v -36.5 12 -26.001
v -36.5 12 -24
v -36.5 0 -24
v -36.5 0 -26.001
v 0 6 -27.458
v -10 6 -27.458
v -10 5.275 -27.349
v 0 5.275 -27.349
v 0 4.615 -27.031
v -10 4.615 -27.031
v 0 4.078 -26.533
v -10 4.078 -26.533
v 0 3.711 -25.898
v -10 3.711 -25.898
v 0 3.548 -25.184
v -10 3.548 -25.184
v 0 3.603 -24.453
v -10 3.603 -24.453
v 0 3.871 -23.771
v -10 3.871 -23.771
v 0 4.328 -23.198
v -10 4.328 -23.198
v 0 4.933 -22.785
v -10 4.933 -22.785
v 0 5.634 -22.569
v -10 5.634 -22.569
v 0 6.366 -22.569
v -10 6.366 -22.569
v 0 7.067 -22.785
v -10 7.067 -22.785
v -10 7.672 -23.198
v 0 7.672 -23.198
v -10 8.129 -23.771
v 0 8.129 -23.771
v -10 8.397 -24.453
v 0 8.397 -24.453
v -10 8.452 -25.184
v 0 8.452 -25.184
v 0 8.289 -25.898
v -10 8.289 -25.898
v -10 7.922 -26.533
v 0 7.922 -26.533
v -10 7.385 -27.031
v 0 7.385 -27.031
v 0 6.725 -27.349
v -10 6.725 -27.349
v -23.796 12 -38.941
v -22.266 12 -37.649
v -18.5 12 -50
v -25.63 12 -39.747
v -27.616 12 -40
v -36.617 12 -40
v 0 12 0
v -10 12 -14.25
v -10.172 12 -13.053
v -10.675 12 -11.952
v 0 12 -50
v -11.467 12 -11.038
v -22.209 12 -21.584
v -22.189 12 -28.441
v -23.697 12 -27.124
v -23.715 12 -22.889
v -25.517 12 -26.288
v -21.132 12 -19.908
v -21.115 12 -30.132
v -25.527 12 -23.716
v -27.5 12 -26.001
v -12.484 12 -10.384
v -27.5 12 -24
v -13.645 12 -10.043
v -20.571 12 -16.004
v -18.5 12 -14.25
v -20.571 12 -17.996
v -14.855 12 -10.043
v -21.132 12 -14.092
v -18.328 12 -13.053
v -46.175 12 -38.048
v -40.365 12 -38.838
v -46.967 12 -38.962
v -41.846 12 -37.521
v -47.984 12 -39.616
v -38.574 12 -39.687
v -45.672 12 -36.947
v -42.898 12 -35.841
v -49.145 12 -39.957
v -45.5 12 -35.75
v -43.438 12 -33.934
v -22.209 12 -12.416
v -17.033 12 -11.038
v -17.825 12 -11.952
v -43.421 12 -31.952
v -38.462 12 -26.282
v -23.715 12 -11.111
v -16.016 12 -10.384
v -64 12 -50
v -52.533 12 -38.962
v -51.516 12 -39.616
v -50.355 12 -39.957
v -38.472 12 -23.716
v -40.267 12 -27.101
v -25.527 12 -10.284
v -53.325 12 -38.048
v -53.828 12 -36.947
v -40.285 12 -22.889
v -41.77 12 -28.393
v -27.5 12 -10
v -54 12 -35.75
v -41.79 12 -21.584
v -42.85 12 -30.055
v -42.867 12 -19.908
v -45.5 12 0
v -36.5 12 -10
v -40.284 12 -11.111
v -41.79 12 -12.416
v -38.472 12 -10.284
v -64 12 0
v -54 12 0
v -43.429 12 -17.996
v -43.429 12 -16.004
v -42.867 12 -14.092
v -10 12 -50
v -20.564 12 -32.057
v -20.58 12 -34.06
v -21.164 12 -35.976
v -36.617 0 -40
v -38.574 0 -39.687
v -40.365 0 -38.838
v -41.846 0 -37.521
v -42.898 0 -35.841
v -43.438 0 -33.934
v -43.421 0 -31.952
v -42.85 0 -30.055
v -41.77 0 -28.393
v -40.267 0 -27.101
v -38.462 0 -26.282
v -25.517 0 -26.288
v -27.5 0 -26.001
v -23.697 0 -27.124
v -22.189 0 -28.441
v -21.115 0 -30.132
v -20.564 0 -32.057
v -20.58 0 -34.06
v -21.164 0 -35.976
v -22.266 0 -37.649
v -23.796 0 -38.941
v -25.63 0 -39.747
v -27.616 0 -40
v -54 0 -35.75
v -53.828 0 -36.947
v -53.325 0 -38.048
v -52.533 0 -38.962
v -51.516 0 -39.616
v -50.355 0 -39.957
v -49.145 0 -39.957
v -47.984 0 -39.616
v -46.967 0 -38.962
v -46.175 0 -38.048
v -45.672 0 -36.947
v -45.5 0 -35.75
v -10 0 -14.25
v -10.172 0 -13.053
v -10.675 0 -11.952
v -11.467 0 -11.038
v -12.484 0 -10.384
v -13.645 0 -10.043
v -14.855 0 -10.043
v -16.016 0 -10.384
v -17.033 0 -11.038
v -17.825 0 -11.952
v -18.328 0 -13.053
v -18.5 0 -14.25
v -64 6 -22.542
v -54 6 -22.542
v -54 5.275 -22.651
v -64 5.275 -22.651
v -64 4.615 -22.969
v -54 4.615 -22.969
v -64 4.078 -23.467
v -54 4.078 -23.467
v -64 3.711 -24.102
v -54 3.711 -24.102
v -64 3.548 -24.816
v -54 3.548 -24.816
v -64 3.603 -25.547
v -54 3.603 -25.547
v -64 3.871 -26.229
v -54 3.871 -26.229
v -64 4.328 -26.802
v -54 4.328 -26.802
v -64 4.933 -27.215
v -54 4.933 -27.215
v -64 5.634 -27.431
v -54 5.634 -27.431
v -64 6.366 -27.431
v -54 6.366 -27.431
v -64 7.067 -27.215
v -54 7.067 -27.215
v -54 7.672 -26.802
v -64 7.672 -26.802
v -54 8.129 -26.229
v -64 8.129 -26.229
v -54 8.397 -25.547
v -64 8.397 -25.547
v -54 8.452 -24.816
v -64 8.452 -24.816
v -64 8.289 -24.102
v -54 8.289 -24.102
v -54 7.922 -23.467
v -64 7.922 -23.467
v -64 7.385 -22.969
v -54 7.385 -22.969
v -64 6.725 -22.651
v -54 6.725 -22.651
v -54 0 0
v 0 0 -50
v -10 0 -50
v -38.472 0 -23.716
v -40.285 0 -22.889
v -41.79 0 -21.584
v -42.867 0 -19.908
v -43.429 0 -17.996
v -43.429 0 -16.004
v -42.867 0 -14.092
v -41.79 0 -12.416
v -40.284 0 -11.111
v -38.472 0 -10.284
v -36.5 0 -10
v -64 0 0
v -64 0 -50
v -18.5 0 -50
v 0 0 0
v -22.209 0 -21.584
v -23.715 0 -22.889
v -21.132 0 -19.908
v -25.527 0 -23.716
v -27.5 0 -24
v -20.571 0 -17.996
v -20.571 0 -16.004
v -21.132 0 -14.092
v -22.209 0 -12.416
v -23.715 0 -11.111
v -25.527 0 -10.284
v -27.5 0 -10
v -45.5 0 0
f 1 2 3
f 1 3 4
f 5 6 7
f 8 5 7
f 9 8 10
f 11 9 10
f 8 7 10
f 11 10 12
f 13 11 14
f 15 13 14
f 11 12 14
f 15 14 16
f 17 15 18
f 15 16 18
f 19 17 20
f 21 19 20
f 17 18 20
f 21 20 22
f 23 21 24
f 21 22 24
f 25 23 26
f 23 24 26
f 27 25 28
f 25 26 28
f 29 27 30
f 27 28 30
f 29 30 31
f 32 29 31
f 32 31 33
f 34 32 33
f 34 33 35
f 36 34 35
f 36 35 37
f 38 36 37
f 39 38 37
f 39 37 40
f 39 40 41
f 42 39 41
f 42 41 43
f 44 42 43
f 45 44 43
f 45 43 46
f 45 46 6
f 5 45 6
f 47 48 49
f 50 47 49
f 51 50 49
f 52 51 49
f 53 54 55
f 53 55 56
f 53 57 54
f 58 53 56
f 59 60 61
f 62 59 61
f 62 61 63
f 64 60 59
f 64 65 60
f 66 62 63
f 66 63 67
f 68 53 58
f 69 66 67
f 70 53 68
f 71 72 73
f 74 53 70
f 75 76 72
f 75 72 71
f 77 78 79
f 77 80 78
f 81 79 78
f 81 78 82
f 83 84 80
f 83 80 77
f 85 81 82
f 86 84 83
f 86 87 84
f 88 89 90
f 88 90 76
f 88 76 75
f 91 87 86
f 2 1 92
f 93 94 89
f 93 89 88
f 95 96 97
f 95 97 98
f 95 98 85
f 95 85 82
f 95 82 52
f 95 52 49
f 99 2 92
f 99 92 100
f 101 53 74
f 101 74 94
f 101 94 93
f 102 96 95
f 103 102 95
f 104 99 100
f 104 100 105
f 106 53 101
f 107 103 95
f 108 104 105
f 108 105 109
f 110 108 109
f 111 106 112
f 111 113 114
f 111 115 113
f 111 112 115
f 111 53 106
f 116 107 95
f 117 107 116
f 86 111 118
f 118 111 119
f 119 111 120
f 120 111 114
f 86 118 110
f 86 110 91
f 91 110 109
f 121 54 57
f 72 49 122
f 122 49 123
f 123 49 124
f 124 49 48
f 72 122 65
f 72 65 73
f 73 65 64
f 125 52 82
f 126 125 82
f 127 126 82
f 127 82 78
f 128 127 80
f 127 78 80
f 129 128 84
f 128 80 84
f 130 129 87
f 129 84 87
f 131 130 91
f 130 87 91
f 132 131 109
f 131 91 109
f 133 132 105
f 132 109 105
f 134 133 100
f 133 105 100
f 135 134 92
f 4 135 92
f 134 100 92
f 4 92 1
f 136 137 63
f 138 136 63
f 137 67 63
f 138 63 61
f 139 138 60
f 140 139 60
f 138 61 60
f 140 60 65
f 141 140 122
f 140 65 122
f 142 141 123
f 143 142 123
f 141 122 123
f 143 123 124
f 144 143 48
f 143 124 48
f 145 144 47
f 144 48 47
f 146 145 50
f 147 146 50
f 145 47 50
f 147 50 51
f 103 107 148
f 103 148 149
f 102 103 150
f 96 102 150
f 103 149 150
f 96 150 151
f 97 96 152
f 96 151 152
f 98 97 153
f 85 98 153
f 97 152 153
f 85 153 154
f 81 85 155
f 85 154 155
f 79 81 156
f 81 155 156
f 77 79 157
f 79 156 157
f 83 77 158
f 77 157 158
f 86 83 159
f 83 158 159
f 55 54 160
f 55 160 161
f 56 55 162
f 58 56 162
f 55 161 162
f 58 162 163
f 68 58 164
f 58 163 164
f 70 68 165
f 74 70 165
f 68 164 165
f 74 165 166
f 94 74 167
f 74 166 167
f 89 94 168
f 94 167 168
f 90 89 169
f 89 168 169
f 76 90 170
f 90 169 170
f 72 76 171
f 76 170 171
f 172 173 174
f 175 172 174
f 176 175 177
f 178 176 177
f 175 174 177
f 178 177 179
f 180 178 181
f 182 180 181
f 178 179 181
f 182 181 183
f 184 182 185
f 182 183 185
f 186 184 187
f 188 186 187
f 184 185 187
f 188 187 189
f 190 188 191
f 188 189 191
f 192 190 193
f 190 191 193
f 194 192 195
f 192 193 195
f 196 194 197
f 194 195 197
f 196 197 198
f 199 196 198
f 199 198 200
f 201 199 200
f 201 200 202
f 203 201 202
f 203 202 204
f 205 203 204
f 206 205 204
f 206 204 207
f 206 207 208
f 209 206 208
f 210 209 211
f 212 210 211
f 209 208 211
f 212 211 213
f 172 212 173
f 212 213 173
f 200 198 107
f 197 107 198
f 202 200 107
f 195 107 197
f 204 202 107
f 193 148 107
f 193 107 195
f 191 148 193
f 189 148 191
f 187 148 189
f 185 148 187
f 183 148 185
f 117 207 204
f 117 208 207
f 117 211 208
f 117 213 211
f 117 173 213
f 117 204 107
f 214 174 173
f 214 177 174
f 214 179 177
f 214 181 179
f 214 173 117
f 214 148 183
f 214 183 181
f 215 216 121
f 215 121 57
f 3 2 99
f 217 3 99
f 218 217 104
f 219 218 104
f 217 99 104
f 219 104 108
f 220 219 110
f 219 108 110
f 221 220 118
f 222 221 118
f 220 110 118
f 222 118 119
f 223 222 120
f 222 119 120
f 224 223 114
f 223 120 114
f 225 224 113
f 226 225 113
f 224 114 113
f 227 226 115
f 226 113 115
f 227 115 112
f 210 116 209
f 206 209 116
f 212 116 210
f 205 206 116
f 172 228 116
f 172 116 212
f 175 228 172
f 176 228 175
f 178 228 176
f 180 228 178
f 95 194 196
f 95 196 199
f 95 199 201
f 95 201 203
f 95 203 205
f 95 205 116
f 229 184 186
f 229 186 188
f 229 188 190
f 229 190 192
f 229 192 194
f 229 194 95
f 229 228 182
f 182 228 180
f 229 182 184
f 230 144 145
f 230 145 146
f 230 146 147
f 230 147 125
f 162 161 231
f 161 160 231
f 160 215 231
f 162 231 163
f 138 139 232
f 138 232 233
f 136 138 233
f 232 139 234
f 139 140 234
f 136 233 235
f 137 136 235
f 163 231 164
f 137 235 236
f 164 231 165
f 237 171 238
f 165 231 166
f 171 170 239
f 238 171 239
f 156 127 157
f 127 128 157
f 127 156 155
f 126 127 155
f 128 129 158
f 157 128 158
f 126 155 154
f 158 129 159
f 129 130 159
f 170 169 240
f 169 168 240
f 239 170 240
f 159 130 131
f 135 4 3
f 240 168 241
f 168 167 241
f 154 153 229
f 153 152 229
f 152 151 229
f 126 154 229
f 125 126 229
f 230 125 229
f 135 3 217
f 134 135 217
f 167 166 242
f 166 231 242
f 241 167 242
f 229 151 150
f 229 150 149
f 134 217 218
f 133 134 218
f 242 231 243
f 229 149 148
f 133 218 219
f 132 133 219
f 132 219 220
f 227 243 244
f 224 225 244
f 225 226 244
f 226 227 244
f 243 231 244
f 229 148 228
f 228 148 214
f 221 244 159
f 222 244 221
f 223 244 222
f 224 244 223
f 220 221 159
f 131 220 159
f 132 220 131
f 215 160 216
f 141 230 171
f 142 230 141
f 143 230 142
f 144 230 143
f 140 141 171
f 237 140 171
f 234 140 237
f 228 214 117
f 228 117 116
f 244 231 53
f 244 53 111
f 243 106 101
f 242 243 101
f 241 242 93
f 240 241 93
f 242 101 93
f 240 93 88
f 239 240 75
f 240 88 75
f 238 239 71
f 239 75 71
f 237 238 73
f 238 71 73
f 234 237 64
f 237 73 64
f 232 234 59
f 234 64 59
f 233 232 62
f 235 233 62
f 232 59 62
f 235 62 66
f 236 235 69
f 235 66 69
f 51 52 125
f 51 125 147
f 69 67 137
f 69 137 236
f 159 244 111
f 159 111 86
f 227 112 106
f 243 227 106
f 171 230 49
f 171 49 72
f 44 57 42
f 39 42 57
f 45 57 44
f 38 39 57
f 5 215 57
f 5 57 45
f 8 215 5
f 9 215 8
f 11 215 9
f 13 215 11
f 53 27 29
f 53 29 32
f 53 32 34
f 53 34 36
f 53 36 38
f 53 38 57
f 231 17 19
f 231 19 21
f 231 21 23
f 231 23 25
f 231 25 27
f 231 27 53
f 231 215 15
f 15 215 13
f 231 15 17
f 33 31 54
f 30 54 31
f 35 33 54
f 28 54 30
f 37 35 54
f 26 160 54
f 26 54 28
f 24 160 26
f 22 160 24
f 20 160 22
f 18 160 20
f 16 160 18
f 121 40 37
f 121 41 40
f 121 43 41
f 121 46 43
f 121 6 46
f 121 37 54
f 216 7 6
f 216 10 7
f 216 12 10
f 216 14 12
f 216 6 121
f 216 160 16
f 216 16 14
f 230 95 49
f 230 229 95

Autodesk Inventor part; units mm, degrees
ref_plane "YZ Plane" through (0, 0, 0) normal (1, 0, 0) x (0, 1, 0)
ref_plane "XZ Plane" through (0, 0, 0) normal (0, 1, 0) x (-1, 0, 0)
ref_plane "XY Plane" through (0, 0, 0) normal (0, 0, 1) x (1, 0, 0)
sketch "Esboço1" plane through (0, 0, 0) normal (0, 1, 0) x (-1, 0, 0)
  line L0 (0, 0) -> (45.5, 0)
  line L1 (45.5, 0) -> (45.5, -35.75)
  line L2 (49.75, -40) -> (49.75, -40)
  line L3 (54, -35.75) -> (54, 0)
  line L4 (54, 0) -> (64, 0)
  line L5 (64, 0) -> (64, -50)
  line L6 (64, -50) -> (18.5, -50)
  line L7 (18.5, -50) -> (18.5, -14.25)
  line L8 (14.25, -10) -> (14.25, -10)
  line L9 (10, -14.25) -> (10, -50)
  line L10 (10, -50) -> (0, -50)
  line L11 (0, -50) -> (0, 0)
  arc A0 (18.5, -14.25) -> (14.25, -10) centre (14.25, -14.25) ccw
  arc A1 (14.25, -10) -> (10, -14.25) centre (14.25, -14.25) ccw
  arc A2 (45.5, -35.75) -> (49.75, -40) centre (49.75, -35.75) ccw
  arc A3 (49.75, -40) -> (54, -35.75) centre (49.75, -35.75) ccw
  point P0 (45.5, -40)
  point P1 (54, -40)
  point P2 (10, -10)
  dimension "d0" = 64
  dimension "d1" = 10
  dimension "d2" = 40
  dimension "d3" = 50
  dimension "d4" = 8.5
  dimension "d5" = 4.25
extrude "Extrusão1" add sketch "Esboço1" along normal blind 12
sketch "Esboço2" plane through (0, 0, 0) normal (1, 0, 0) x (0, 0, -1)
  line L0 (0, 12) -> (50, 12) projected
  line L1 (50, 0) -> (50, 12) projected
  point P0 (0, 0)
  point P1 (25, 6)
  dimension "d8" = 50
  dimension "d9" = 12
  dimension "d10" = 6
  dimension "d11" = 25
hole "Furo1" at (0, 6, -25) direction (-1, 0, 0) diameter 4.917 depth 10 thread size "M6x1" class "6H" standard "ISO Metric profile"
sketch "Esboço3" plane through (-64, 0, -50) normal (-1, 0, 0) x (0, 0, 1)
  line L0 (0, 0) -> (50, 0) projected
  line L1 (0, 0) -> (0, 12) projected
  circle A0 centre (25, 6) radius 2.4585 projected
  dimension "d19" = 50
  dimension "d20" = 12
hole "Furo2" at (-64, 6, -25) direction (1, 0, 0) diameter 4.917 depth 10 thread size "M6x1" class "6H" standard "ISO Metric profile"
sketch "Sketch4" plane through (0, 12, 0) normal (0, 1, 0) x (1, 0, 0)
  line L0 (-36.5, 10) -> (-27.4995, 10)
  arc A0 (-27.4995, 10) -> (-27.4995, 24) centre (-27.4995, 17) ccw
  arc A1 (-36.5002, 24) -> (-36.5, 10) centre (-36.5, 17) ccw
  line L1 (-36.5, 24) -> (-27.4995, 24)
  line L2 (-13.5, 10) -> (-19.5, 10) projected
  line L3 (-36.5002, 26.001) -> (-27.4998, 26.001)
  arc A2 (-27.4998, 26.001) -> (-27.6165, 40) centre (-27.4998, 33.001) ccw
  arc A3 (-36.6169, 40) -> (-36.5002, 26.001) centre (-36.5002, 33.001) ccw
  line L4 (-36.6169, 40) -> (-27.6165, 40)
  line L5 (-45.5, 35.75) -> (-45.5, 0) projected
  line L6 (-50.5, 40) -> (-44.5, 40) projected
  line L7 (-18.5, 14.25) -> (-18.5, 50) projected
  line L8 (-36.5002, 26.001) -> (-27.4995, 26.001)
  line L9 (-27.4995, 26.001) -> (-27.4995, 24)
  line L10 (-27.4995, 24) -> (-36.5002, 24)
  line L11 (-36.5002, 24) -> (-36.5002, 26.001)
  point P0 (0, 0)
  point P1 (-31.9998, 10)
  point P2 (-20.5, 33.0593)
  point P3 (-43.5, 32.9426)
  point P4 (-32, 26.001)
  point P5 (-43.5, 16.9999)
  dimension "d28" = 0
  dimension "d29" = 0
  dimension "d30" = 23
  dimension "d31" = 13.5
  dimension "d32" = 27
  dimension "d33" = 0
  dimension "d34" = 7
  dimension "d35" = 0
extrude "Extrusion2" cut sketch "Sketch4" against normal through all
equation "\"d10\" = 0.5 * d9"
equation "\"d11\" = 0.5 * d8"
equation "\"d17\" = Espessura"
equation "\"d31\" = 0.5 * d32"
equation "\"Raio_vergadura\" = Espessura"
equation "\"Largura_alívio_de_vergadura\" = Espessura"
equation "\"Profundidade_alívio_de_vergadura\" = 0.5 * Espessura"
equation "\"Tamanho_alívio_de_dobra\" = 4 * Espessura"
equation "\"Remanescente_mínimo\" = 2 * Espessura"
equation "\"Raiodetransição\" = Raio_vergadura"
equation "\"Tamanho_de_raio_de_Jacobi\" = Raio_vergadura"
equation "\"TamanhoFolga\" = Espessura"
equation "\"Espessura\" = 0.5"
properties part number "Célula de carga" material "Alumínio 6061"
